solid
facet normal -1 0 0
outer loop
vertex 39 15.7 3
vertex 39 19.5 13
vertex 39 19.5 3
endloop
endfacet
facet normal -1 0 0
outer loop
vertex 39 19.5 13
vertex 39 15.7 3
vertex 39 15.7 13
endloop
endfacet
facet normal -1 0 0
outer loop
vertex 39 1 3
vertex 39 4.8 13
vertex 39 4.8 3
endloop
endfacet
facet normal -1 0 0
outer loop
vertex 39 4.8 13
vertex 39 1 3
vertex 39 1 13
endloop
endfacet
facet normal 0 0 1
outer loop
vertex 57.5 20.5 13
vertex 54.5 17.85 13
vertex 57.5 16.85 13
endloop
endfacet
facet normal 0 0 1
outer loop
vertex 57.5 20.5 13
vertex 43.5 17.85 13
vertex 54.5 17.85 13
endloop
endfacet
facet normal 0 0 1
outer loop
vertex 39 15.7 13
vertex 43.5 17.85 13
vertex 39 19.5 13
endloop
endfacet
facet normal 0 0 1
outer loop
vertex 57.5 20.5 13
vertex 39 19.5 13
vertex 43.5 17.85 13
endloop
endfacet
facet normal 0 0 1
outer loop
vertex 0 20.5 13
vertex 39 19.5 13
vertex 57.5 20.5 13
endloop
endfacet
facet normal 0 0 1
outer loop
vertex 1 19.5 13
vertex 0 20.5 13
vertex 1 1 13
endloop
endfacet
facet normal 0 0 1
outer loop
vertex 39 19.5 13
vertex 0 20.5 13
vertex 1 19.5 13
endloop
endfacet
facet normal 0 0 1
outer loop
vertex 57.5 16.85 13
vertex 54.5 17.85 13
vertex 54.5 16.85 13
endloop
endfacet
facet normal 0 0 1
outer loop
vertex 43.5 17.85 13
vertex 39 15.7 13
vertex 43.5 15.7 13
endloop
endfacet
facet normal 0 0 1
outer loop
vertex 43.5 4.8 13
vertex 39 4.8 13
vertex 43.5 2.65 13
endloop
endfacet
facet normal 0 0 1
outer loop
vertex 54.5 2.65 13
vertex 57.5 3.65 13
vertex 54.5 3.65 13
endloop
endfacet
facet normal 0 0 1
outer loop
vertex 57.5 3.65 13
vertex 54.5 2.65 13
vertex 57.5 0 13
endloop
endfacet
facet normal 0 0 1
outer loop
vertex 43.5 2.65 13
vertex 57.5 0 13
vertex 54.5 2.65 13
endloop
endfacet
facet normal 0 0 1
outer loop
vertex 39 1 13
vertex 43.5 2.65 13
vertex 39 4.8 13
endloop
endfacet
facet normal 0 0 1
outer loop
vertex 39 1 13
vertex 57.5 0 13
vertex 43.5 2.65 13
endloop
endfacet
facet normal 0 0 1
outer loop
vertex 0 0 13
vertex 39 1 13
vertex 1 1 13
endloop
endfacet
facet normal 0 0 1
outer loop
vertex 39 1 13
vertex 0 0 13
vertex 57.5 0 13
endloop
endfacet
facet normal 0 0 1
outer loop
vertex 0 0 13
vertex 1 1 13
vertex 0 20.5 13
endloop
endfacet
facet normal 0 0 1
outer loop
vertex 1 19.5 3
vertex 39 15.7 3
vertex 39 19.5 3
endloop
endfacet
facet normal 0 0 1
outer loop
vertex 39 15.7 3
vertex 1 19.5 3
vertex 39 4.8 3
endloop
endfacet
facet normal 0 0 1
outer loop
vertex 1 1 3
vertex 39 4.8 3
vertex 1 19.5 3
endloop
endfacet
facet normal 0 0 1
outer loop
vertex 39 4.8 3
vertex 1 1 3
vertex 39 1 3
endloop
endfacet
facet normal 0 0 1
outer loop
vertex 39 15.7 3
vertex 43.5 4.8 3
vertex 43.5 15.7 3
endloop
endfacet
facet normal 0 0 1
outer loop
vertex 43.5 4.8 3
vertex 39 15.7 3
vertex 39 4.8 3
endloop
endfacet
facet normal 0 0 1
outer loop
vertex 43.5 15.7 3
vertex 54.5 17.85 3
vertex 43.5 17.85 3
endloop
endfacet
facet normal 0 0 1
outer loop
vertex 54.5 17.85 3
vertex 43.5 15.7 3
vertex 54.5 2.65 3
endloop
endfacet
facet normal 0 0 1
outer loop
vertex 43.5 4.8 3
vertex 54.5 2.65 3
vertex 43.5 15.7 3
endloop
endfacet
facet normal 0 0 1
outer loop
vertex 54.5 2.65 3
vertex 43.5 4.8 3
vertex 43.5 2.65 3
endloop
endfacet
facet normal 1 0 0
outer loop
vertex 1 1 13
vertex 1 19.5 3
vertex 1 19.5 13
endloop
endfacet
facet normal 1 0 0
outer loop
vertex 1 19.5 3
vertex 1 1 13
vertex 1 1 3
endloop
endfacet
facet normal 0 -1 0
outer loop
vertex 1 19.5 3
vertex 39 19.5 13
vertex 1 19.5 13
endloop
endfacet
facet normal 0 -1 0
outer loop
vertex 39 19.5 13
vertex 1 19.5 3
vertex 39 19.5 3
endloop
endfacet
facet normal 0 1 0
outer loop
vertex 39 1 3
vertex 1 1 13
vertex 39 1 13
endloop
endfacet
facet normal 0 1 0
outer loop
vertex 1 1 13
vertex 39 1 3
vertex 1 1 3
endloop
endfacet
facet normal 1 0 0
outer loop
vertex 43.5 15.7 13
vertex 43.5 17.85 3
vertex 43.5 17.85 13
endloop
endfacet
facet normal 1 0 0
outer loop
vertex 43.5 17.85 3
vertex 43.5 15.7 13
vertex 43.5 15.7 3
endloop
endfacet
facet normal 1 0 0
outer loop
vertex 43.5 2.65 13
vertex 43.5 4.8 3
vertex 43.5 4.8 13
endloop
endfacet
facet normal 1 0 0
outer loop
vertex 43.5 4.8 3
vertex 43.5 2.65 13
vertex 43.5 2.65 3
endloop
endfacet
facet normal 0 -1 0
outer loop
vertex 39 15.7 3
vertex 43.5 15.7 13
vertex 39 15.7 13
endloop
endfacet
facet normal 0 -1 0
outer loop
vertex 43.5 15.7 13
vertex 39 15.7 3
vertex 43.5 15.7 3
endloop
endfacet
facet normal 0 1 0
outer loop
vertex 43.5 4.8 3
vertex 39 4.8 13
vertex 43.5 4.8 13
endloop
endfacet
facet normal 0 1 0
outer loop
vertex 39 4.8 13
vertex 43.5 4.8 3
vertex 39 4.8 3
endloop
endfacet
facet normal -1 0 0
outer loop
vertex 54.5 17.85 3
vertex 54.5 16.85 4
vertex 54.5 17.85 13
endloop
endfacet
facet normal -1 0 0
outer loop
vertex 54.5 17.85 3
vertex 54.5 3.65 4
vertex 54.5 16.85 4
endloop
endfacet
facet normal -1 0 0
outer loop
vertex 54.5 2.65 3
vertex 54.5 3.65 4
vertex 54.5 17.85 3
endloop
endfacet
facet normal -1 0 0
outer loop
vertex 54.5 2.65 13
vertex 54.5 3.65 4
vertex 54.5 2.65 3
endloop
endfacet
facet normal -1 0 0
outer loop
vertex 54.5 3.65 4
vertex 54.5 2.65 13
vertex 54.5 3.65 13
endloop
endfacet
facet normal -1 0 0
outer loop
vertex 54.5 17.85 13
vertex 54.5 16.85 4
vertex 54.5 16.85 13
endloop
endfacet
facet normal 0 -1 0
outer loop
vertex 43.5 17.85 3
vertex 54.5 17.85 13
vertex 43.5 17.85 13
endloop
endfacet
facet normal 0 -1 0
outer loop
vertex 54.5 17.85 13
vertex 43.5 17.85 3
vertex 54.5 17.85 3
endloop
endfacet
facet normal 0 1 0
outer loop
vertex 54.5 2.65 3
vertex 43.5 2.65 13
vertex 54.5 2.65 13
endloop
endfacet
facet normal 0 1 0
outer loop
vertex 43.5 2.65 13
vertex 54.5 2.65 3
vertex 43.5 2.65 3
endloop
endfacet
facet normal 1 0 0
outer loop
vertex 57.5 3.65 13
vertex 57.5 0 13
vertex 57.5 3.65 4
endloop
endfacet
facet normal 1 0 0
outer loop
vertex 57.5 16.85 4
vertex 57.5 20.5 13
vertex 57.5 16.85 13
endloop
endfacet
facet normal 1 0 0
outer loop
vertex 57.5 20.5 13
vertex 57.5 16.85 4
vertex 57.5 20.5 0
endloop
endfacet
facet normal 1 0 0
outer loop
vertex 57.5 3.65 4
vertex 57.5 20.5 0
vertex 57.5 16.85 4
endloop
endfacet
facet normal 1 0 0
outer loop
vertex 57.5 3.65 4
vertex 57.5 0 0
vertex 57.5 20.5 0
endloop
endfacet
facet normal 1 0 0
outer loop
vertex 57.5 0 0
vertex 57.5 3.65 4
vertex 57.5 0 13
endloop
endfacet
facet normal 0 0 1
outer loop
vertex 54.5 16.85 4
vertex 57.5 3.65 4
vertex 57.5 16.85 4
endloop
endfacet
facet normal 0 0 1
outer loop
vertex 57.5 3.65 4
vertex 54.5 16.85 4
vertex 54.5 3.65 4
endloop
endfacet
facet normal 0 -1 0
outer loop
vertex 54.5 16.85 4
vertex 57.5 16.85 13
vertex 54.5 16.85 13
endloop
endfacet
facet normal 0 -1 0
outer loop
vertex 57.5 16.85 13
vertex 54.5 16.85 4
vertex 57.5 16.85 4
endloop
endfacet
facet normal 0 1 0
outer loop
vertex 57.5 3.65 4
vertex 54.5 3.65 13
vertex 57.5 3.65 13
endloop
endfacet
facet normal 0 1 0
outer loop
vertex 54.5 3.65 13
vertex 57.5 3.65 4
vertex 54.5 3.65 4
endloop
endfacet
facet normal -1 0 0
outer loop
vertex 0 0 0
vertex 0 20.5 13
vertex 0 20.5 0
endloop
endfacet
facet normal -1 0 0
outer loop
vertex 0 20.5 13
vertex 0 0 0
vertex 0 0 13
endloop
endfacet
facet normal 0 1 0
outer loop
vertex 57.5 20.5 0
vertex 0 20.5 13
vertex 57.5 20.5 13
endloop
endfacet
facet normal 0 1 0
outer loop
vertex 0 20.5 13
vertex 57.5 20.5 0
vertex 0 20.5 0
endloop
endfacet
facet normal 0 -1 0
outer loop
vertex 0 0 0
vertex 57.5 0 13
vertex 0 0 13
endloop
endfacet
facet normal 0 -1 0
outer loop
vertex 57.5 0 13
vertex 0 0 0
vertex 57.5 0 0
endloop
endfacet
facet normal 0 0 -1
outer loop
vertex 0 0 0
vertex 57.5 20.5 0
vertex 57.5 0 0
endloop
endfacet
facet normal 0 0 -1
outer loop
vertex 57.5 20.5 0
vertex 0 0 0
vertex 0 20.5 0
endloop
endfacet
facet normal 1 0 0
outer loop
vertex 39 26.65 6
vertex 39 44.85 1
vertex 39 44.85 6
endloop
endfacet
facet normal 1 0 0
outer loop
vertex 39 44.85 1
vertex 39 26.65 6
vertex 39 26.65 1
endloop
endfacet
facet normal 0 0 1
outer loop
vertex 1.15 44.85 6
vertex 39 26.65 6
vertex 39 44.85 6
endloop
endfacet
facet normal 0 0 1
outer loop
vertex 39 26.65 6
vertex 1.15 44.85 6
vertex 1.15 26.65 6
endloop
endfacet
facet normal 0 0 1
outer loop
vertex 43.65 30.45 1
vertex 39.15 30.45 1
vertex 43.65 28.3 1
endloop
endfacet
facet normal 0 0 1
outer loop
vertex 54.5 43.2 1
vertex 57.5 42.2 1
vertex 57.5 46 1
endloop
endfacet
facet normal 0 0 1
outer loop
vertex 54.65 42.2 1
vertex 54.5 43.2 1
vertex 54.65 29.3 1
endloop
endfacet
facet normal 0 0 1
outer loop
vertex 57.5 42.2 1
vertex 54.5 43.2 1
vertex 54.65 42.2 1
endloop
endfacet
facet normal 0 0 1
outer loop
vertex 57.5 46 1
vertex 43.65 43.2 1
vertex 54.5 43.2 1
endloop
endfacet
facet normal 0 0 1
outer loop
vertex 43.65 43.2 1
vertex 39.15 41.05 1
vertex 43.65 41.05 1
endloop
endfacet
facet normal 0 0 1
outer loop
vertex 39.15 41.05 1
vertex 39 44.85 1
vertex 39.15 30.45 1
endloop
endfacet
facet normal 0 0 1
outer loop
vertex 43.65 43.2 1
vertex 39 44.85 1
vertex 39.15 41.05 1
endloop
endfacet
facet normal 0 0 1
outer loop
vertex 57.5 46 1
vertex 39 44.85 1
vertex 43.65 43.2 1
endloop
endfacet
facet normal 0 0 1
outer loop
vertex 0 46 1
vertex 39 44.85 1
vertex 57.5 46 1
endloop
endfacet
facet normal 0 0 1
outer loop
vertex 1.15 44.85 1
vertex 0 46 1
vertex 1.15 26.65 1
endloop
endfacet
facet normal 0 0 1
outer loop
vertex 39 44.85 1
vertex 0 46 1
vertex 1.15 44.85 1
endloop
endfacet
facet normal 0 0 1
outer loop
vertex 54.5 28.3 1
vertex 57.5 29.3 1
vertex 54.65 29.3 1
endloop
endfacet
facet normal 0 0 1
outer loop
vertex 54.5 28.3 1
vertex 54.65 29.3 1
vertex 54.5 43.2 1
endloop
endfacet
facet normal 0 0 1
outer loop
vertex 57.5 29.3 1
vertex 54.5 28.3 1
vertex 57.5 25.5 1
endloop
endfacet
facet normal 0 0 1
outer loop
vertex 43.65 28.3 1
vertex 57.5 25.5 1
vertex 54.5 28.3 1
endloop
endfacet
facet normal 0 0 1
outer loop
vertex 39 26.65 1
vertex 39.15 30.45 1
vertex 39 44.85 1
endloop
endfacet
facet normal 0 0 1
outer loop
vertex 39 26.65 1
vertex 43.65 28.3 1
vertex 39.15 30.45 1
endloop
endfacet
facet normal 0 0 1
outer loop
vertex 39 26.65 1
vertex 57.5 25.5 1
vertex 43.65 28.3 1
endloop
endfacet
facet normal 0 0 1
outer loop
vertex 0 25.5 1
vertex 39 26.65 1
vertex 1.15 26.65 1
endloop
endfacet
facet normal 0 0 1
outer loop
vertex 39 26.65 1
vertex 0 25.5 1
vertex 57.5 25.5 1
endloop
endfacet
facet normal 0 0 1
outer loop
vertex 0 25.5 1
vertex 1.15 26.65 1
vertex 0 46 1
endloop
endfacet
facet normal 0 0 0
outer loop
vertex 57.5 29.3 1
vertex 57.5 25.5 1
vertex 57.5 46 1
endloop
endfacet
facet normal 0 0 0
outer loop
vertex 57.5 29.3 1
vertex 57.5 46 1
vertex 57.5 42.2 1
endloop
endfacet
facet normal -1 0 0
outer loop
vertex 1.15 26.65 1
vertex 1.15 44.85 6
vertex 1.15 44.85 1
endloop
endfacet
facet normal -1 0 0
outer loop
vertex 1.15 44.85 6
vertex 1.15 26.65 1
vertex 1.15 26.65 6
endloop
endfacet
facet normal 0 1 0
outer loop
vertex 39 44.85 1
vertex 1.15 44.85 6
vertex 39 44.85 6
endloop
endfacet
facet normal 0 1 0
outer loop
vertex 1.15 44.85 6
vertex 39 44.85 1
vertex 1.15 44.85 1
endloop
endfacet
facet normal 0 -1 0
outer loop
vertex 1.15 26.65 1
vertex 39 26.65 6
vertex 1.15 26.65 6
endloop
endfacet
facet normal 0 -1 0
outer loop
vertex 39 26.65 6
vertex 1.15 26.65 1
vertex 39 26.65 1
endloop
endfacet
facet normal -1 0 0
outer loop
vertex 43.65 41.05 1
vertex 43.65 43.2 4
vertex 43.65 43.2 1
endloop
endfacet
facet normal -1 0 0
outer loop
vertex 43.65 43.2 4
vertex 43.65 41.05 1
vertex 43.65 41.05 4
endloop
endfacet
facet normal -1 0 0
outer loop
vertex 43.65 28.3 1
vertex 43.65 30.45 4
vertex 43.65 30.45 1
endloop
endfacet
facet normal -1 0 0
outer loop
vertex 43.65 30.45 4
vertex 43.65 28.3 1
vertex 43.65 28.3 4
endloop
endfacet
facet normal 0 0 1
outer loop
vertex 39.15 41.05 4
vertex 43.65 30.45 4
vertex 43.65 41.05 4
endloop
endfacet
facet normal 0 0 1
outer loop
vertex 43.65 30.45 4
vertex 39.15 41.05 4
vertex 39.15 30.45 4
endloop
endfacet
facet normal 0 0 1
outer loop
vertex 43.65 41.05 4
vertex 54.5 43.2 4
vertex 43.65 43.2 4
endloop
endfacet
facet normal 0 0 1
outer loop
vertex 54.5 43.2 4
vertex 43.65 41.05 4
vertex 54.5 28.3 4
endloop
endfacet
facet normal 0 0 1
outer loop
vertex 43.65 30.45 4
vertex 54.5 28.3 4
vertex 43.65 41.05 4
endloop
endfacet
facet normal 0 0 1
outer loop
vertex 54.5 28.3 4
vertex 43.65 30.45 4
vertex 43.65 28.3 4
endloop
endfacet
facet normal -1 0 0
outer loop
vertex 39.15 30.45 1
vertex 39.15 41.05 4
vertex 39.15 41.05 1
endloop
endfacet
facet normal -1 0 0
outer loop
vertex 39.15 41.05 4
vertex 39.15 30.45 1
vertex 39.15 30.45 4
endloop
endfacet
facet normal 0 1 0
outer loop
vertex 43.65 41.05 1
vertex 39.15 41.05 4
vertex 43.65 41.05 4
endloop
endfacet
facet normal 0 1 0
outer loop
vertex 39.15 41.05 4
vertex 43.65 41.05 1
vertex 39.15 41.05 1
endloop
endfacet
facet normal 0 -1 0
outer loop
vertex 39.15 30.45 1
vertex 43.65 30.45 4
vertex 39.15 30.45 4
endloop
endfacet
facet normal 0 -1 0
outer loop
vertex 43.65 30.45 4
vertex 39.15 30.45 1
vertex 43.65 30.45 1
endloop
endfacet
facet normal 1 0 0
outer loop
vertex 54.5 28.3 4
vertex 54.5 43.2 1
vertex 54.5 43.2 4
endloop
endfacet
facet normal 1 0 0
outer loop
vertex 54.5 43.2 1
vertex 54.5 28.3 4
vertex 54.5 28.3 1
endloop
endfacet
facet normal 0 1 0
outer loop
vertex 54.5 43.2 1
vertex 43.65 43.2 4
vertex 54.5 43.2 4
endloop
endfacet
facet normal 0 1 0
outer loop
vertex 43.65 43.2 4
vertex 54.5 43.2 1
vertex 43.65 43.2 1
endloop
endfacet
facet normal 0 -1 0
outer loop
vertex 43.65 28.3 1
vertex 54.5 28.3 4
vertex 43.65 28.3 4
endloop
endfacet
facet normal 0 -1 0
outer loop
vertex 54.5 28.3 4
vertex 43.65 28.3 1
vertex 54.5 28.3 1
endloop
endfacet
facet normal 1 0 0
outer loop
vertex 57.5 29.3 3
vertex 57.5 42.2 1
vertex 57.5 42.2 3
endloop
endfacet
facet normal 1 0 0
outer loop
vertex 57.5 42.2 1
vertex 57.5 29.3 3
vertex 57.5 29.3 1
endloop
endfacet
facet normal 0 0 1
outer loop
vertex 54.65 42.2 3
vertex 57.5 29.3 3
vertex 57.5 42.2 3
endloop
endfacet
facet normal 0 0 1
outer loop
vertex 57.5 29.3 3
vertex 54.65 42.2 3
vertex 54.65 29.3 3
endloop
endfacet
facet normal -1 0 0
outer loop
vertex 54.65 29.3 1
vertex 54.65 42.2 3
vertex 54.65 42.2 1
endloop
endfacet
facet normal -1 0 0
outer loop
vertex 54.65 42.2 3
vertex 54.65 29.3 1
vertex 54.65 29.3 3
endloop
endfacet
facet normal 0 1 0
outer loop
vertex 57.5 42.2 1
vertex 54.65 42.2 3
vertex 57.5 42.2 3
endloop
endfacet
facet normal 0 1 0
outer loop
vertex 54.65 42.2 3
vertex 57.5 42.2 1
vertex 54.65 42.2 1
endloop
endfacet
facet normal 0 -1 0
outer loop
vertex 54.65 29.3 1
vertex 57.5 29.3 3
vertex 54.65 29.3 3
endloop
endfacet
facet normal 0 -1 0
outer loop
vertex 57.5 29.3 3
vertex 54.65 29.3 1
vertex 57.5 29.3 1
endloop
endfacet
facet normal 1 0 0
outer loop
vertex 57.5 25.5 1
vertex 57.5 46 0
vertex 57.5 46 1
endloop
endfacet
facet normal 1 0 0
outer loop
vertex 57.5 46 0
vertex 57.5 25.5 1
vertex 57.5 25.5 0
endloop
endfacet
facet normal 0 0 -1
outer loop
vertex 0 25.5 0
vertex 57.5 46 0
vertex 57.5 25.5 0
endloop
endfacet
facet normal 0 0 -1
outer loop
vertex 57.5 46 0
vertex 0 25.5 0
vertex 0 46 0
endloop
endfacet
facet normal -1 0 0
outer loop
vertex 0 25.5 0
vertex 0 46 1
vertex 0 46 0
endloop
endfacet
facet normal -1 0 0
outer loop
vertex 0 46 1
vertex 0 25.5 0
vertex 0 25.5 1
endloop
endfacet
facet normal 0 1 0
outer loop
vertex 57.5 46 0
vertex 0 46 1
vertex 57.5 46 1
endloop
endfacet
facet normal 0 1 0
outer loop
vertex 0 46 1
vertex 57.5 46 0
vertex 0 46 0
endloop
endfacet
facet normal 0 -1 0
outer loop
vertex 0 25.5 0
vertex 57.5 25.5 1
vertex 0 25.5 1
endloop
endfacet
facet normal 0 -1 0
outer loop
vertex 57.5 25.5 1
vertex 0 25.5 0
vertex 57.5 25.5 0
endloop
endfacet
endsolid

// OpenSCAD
// Gemeinsame Parameter für beide Module
laenge = 56.5;    // von 53.5 auf 56.5 erhöht, um den vorderen Raum auf 11mm zu vergrößern
breite_hinten = 18.5;  
breite_vorne = 15.2;   
wandstaerke = 1;   
bodenstaerke = 3;
hoehe = 10;

// Verdickungsparameter
verdickung_abstand = 38;    
verdickung_laenge = 4.5;     
verdickung_tiefe = 3.8;
verdickung_ende = verdickung_abstand + verdickung_laenge;

// Parameter für die vordere Verengung
verengung_tiefe = 1;  // 1mm Verengung von allen Seiten
verengung_hoehe = 5;  // Höhe der Verengung
verengung_laenge = 3; // Länge der Verengung

// Deckelparameter
deckel_hoehe = 1;
praegung_hoehe = 3;
praegung_hoehe_hinten = 5;

// Presspassung - negative Werte = enger, positive = lockerer
presspassung = 0.15;  

// Äußere Breite
aussen_breite = breite_hinten + (2 * wandstaerke);

// Modul für das U-Profil
module u_profil() {
    union() {
        // Boden
        cube([laenge + wandstaerke, aussen_breite, bodenstaerke]);
        
        difference() {
            // Äußerer Block für alle Wände
            translate([0, 0, bodenstaerke])
                cube([laenge + wandstaerke, aussen_breite, hoehe]);
            
            // Innere Ausschnitte
            translate([wandstaerke, wandstaerke, bodenstaerke]) {
                // Ausschnitt bis zur Verdickung
                cube([verdickung_abstand, breite_hinten, hoehe]);
                
                // Ausschnitt im Bereich der Verdickung
                translate([verdickung_abstand, verdickung_tiefe, 0])
                    cube([verdickung_laenge, breite_hinten - (2 * verdickung_tiefe), hoehe]);
                
                // Ausschnitt nach der Verdickung (bis zur Verengung)
                translate([verdickung_ende, (breite_hinten - breite_vorne) / 2, 0])
                    cube([laenge - verdickung_ende - verengung_laenge, breite_vorne, hoehe]);
                
                // Ausschnitt für die vordere Verengung (schmaler und höher)
                translate([laenge - verengung_laenge, (breite_hinten - breite_vorne) / 2 + verengung_tiefe, verengung_tiefe])
                    cube([verengung_laenge, breite_vorne - (2 * verengung_tiefe), hoehe - verengung_tiefe]);
            }
        }
    }
}

// Modul für den Deckel
module deckel() {
    union() {
        // Deckelplatte 
        cube([laenge + wandstaerke, aussen_breite, deckel_hoehe]); // Länge entspricht jetzt 56.5 + 1 mm
        
        // Männliche Prägung (nach oben)
        translate([wandstaerke + presspassung, wandstaerke + presspassung, deckel_hoehe]) {
            union() {
                // Hinterer Bereich (mit anderer Höhe)
                cube([verdickung_abstand - presspassung, breite_hinten - (2 * presspassung), praegung_hoehe_hinten]);
                
                // Mittlerer Bereich (mit Verdickung)
                translate([verdickung_abstand, verdickung_tiefe, 0])
                    cube([verdickung_laenge, breite_hinten - (2 * verdickung_tiefe) - (2 * presspassung), praegung_hoehe]);
                
                // Vorderer Bereich (bis zur Verengung)
                translate([verdickung_ende, (breite_hinten - breite_vorne) / 2, 0])
                    cube([laenge - verdickung_ende - verengung_laenge - presspassung, breite_vorne - (2 * presspassung), praegung_hoehe]);
                
                // Verengter Bereich (angepasst an die Verengung)
                translate([laenge - verengung_laenge, (breite_hinten - breite_vorne) / 2 + verengung_tiefe, 0])
                    cube([verengung_laenge - presspassung, breite_vorne - (2 * verengung_tiefe) - (2 * presspassung), praegung_hoehe - verengung_tiefe]);
            }
        }
    }
}

// Platzierung der Module nebeneinander mit 5mm Abstand
u_profil();
translate([0, aussen_breite + 5, 0]) deckel();
